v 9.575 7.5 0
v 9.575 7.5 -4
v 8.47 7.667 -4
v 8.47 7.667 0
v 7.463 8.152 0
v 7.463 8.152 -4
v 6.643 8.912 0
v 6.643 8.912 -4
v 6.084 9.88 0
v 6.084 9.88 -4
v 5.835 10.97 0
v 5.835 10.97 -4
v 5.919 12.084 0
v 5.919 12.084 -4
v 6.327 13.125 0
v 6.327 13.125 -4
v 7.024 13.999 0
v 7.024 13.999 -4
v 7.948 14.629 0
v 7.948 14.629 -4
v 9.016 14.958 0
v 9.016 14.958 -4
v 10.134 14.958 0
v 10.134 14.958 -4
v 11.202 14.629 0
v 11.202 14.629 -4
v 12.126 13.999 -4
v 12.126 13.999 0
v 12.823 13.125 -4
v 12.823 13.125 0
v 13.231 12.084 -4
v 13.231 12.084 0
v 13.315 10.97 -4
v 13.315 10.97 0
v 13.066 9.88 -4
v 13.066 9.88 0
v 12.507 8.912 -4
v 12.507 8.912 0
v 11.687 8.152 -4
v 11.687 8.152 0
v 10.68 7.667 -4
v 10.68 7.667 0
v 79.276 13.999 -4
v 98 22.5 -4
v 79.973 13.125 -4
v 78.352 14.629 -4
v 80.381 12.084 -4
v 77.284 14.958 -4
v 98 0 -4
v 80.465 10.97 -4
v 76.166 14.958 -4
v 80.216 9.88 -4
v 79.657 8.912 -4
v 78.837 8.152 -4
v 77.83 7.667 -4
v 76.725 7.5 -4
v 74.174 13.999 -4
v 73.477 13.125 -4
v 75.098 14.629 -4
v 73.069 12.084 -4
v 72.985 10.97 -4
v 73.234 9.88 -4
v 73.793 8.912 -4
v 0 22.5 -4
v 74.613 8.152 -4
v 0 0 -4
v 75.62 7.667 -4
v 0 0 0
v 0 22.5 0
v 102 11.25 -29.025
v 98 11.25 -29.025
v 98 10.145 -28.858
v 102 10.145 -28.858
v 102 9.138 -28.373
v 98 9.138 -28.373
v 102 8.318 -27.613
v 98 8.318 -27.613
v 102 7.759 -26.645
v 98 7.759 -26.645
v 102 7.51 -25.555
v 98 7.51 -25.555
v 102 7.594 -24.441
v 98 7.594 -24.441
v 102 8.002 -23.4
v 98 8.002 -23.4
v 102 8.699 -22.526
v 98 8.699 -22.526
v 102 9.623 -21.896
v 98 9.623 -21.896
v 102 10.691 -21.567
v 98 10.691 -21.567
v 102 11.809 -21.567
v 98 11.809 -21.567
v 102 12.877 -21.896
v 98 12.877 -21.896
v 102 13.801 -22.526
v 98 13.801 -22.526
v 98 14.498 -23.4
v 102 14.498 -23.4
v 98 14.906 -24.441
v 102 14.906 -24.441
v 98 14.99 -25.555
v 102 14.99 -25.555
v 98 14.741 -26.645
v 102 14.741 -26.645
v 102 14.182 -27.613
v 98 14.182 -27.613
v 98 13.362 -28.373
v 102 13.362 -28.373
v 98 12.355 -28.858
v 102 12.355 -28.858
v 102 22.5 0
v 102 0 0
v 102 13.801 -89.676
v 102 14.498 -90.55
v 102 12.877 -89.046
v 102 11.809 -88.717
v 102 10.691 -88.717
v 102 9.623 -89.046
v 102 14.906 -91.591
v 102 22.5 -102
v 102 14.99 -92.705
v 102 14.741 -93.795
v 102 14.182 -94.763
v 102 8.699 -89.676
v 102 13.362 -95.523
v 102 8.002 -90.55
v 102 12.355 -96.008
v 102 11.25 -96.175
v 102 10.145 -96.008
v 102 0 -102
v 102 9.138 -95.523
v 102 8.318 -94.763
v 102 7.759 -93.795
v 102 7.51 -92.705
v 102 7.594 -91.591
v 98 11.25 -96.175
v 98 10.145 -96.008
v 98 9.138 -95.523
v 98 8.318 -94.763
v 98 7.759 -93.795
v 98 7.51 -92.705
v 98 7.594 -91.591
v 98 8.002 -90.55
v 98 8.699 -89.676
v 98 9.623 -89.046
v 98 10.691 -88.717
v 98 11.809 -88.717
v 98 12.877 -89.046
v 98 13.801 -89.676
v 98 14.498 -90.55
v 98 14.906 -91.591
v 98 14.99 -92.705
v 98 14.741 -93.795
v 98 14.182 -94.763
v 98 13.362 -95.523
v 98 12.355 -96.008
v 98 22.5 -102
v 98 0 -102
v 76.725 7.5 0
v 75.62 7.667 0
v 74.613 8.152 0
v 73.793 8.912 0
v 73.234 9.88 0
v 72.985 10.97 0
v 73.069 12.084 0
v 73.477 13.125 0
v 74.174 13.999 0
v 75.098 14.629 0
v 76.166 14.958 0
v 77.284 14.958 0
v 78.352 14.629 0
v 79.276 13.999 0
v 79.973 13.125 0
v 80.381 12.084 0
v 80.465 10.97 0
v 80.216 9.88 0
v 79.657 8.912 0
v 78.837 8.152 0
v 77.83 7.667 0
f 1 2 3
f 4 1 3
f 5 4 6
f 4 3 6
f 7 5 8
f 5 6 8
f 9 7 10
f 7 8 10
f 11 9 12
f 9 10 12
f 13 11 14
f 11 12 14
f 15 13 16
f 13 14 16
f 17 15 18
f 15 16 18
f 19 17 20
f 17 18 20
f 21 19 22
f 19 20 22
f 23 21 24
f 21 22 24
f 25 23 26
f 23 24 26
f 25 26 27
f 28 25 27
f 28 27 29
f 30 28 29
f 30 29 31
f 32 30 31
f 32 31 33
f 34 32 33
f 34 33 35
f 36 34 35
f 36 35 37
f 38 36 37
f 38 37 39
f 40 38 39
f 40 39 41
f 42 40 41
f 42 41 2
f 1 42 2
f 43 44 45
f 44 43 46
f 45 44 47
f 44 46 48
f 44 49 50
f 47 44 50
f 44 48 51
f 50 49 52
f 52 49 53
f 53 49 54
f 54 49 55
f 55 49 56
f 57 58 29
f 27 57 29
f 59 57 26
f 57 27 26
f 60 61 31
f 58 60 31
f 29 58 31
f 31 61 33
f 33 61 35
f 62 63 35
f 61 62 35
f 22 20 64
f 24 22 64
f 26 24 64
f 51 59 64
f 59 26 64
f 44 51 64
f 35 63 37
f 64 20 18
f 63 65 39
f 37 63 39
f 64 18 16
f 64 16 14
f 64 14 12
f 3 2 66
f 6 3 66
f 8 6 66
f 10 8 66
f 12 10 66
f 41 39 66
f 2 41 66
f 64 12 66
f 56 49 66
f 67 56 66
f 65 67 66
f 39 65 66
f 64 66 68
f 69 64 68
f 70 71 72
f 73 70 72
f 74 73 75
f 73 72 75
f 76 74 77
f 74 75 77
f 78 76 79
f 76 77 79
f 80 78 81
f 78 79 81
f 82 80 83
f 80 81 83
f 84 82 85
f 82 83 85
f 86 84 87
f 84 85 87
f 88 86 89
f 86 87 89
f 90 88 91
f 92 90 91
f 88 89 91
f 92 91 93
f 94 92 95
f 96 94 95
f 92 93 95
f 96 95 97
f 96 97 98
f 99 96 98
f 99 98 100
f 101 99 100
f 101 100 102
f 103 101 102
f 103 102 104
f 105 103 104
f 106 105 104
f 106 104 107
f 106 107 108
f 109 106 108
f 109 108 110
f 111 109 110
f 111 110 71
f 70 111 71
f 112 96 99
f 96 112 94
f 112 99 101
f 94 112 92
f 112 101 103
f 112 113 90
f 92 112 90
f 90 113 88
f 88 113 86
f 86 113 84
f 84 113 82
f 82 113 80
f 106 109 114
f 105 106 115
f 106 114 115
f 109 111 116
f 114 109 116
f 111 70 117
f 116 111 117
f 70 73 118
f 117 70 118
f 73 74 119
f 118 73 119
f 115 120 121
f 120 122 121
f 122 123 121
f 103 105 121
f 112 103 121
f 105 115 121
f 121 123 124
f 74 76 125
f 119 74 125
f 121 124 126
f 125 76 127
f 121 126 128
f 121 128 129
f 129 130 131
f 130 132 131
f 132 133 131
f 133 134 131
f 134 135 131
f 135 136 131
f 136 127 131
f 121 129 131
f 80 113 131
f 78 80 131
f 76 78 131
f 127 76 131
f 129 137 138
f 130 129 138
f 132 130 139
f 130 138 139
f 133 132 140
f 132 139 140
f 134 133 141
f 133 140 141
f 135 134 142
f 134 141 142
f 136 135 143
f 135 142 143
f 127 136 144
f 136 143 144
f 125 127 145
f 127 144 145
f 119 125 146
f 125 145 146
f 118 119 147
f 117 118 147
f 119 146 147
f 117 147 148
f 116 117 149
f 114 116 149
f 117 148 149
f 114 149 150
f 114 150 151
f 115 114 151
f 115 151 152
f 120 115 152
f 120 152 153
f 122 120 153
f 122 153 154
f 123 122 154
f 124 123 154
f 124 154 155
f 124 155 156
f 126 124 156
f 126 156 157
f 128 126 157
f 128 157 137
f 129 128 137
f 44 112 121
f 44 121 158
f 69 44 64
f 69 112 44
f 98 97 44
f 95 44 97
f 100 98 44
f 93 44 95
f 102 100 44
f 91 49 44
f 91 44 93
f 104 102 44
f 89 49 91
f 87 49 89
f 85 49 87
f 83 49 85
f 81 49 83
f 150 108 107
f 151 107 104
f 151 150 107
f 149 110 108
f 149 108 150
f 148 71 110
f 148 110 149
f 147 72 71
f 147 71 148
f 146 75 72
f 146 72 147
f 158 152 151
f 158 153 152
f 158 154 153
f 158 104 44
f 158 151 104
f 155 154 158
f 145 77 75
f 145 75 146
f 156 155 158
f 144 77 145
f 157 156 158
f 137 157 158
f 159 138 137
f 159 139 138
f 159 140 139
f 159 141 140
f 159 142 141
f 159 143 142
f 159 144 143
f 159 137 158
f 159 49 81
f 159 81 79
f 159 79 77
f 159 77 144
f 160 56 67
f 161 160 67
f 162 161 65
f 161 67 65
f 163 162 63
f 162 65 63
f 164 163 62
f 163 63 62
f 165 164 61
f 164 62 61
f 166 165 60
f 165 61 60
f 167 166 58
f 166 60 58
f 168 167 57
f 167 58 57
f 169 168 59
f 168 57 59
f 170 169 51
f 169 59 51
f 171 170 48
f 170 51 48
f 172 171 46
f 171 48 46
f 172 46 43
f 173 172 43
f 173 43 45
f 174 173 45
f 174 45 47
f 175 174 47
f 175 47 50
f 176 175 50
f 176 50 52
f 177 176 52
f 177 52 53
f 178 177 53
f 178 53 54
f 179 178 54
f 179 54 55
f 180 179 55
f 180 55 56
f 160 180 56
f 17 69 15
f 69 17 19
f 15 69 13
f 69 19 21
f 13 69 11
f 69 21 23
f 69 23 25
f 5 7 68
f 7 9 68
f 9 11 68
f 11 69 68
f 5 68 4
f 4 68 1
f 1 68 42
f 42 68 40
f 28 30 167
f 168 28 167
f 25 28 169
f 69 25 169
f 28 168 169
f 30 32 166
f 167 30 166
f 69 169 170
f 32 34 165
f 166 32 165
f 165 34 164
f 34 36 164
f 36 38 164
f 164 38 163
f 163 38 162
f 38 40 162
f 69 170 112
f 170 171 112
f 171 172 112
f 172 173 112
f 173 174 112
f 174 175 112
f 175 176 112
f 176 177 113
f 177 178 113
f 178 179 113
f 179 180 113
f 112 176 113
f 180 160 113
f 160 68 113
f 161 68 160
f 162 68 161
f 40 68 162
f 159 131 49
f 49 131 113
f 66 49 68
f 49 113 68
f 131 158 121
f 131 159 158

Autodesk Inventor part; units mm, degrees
ref_plane "YZ Plane" through (0, 0, 0) normal (1, 0, 0) x (0, 1, 0)
ref_plane "XZ Plane" through (0, 0, 0) normal (0, 1, 0) x (-1, 0, 0)
ref_plane "XY Plane" through (0, 0, 0) normal (0, 0, 1) x (1, 0, 0)
sketch "Sketch1" plane through (0, 0, 0) normal (0, 1, 0) x (-1, 0, 0)
  line L0 (0, 0) -> (-102, 0)
  line L1 (-102, 0) -> (-102, -4)
  line L2 (-102, -4) -> (0, -4)
  line L3 (0, -4) -> (0, 0)
  line L4 (-102, 0) -> (-98, 0)
  line L5 (-98, 0) -> (-98, -102)
  line L6 (-98, -102) -> (-102, -102)
  line L7 (-102, -102) -> (-102, 0)
  point P0 (-98, -4)
  dimension "d0" = 102
  dimension "d1" = 4
  dimension "d2" = 102
  dimension "d3" = 4
extrude "Extrusion1" add sketch "Sketch1" along normal blind 22.5
sketch "Sketch2" plane through (102, 0, 0) normal (1, 0, 0) x (0, 0, -1)
  line L0 (102, 0) -> (102, 22.5) projected
  line L1 (102, 11.25) -> (96, 11.25) construction
  circle A0 centre (92.425, 11.25) radius 3.575
  line L2 (88.85, 11.25) -> (28.85, 11.25) construction
  circle A1 centre (25.275, 11.25) radius 3.575
  line L3 (0, 0) -> (0, 22.5) projected
  line L4 (0, 22.5) -> (102, 22.5) projected
  point P0 (0, 11.25)
  dimension "d9" = 7.15
  dimension "d6" = 6
  dimension "d7" = 7.15
  dimension "d8" = 60
  dimension "d29" = 25.275
  dimension "d30" = 11.25
sketch "Sketch3" plane through (0, 0, 0) normal (0, 0, 1) x (1, 0, 0)
  line L0 (102, 0) -> (102, 22.5) projected
  circle A0 centre (76.725, 11.25) radius 3.575
  line L1 (73.15, 11.25) -> (13.15, 11.25)
  circle A1 centre (9.575, 11.25) radius 3.575
  line L2 (0, 11.25) -> (6, 11.25)
  point P0 (0, 0)
  dimension "d11" = 7.15
  dimension "d12" = 60
  dimension "d13" = 7.15
  dimension "d28" = 6
hole "Hole1" at (102, 11.25, -92.425) at (102, 11.25, -25.275) direction (-1, 0, 0) diameter 7.5 depth 10
hole "Hole2" at (9.575, 11.25, 0) at (76.725, 11.25, 0) direction (0, 0, -1) diameter 7.5 depth 10
properties part number "Lbracket"
